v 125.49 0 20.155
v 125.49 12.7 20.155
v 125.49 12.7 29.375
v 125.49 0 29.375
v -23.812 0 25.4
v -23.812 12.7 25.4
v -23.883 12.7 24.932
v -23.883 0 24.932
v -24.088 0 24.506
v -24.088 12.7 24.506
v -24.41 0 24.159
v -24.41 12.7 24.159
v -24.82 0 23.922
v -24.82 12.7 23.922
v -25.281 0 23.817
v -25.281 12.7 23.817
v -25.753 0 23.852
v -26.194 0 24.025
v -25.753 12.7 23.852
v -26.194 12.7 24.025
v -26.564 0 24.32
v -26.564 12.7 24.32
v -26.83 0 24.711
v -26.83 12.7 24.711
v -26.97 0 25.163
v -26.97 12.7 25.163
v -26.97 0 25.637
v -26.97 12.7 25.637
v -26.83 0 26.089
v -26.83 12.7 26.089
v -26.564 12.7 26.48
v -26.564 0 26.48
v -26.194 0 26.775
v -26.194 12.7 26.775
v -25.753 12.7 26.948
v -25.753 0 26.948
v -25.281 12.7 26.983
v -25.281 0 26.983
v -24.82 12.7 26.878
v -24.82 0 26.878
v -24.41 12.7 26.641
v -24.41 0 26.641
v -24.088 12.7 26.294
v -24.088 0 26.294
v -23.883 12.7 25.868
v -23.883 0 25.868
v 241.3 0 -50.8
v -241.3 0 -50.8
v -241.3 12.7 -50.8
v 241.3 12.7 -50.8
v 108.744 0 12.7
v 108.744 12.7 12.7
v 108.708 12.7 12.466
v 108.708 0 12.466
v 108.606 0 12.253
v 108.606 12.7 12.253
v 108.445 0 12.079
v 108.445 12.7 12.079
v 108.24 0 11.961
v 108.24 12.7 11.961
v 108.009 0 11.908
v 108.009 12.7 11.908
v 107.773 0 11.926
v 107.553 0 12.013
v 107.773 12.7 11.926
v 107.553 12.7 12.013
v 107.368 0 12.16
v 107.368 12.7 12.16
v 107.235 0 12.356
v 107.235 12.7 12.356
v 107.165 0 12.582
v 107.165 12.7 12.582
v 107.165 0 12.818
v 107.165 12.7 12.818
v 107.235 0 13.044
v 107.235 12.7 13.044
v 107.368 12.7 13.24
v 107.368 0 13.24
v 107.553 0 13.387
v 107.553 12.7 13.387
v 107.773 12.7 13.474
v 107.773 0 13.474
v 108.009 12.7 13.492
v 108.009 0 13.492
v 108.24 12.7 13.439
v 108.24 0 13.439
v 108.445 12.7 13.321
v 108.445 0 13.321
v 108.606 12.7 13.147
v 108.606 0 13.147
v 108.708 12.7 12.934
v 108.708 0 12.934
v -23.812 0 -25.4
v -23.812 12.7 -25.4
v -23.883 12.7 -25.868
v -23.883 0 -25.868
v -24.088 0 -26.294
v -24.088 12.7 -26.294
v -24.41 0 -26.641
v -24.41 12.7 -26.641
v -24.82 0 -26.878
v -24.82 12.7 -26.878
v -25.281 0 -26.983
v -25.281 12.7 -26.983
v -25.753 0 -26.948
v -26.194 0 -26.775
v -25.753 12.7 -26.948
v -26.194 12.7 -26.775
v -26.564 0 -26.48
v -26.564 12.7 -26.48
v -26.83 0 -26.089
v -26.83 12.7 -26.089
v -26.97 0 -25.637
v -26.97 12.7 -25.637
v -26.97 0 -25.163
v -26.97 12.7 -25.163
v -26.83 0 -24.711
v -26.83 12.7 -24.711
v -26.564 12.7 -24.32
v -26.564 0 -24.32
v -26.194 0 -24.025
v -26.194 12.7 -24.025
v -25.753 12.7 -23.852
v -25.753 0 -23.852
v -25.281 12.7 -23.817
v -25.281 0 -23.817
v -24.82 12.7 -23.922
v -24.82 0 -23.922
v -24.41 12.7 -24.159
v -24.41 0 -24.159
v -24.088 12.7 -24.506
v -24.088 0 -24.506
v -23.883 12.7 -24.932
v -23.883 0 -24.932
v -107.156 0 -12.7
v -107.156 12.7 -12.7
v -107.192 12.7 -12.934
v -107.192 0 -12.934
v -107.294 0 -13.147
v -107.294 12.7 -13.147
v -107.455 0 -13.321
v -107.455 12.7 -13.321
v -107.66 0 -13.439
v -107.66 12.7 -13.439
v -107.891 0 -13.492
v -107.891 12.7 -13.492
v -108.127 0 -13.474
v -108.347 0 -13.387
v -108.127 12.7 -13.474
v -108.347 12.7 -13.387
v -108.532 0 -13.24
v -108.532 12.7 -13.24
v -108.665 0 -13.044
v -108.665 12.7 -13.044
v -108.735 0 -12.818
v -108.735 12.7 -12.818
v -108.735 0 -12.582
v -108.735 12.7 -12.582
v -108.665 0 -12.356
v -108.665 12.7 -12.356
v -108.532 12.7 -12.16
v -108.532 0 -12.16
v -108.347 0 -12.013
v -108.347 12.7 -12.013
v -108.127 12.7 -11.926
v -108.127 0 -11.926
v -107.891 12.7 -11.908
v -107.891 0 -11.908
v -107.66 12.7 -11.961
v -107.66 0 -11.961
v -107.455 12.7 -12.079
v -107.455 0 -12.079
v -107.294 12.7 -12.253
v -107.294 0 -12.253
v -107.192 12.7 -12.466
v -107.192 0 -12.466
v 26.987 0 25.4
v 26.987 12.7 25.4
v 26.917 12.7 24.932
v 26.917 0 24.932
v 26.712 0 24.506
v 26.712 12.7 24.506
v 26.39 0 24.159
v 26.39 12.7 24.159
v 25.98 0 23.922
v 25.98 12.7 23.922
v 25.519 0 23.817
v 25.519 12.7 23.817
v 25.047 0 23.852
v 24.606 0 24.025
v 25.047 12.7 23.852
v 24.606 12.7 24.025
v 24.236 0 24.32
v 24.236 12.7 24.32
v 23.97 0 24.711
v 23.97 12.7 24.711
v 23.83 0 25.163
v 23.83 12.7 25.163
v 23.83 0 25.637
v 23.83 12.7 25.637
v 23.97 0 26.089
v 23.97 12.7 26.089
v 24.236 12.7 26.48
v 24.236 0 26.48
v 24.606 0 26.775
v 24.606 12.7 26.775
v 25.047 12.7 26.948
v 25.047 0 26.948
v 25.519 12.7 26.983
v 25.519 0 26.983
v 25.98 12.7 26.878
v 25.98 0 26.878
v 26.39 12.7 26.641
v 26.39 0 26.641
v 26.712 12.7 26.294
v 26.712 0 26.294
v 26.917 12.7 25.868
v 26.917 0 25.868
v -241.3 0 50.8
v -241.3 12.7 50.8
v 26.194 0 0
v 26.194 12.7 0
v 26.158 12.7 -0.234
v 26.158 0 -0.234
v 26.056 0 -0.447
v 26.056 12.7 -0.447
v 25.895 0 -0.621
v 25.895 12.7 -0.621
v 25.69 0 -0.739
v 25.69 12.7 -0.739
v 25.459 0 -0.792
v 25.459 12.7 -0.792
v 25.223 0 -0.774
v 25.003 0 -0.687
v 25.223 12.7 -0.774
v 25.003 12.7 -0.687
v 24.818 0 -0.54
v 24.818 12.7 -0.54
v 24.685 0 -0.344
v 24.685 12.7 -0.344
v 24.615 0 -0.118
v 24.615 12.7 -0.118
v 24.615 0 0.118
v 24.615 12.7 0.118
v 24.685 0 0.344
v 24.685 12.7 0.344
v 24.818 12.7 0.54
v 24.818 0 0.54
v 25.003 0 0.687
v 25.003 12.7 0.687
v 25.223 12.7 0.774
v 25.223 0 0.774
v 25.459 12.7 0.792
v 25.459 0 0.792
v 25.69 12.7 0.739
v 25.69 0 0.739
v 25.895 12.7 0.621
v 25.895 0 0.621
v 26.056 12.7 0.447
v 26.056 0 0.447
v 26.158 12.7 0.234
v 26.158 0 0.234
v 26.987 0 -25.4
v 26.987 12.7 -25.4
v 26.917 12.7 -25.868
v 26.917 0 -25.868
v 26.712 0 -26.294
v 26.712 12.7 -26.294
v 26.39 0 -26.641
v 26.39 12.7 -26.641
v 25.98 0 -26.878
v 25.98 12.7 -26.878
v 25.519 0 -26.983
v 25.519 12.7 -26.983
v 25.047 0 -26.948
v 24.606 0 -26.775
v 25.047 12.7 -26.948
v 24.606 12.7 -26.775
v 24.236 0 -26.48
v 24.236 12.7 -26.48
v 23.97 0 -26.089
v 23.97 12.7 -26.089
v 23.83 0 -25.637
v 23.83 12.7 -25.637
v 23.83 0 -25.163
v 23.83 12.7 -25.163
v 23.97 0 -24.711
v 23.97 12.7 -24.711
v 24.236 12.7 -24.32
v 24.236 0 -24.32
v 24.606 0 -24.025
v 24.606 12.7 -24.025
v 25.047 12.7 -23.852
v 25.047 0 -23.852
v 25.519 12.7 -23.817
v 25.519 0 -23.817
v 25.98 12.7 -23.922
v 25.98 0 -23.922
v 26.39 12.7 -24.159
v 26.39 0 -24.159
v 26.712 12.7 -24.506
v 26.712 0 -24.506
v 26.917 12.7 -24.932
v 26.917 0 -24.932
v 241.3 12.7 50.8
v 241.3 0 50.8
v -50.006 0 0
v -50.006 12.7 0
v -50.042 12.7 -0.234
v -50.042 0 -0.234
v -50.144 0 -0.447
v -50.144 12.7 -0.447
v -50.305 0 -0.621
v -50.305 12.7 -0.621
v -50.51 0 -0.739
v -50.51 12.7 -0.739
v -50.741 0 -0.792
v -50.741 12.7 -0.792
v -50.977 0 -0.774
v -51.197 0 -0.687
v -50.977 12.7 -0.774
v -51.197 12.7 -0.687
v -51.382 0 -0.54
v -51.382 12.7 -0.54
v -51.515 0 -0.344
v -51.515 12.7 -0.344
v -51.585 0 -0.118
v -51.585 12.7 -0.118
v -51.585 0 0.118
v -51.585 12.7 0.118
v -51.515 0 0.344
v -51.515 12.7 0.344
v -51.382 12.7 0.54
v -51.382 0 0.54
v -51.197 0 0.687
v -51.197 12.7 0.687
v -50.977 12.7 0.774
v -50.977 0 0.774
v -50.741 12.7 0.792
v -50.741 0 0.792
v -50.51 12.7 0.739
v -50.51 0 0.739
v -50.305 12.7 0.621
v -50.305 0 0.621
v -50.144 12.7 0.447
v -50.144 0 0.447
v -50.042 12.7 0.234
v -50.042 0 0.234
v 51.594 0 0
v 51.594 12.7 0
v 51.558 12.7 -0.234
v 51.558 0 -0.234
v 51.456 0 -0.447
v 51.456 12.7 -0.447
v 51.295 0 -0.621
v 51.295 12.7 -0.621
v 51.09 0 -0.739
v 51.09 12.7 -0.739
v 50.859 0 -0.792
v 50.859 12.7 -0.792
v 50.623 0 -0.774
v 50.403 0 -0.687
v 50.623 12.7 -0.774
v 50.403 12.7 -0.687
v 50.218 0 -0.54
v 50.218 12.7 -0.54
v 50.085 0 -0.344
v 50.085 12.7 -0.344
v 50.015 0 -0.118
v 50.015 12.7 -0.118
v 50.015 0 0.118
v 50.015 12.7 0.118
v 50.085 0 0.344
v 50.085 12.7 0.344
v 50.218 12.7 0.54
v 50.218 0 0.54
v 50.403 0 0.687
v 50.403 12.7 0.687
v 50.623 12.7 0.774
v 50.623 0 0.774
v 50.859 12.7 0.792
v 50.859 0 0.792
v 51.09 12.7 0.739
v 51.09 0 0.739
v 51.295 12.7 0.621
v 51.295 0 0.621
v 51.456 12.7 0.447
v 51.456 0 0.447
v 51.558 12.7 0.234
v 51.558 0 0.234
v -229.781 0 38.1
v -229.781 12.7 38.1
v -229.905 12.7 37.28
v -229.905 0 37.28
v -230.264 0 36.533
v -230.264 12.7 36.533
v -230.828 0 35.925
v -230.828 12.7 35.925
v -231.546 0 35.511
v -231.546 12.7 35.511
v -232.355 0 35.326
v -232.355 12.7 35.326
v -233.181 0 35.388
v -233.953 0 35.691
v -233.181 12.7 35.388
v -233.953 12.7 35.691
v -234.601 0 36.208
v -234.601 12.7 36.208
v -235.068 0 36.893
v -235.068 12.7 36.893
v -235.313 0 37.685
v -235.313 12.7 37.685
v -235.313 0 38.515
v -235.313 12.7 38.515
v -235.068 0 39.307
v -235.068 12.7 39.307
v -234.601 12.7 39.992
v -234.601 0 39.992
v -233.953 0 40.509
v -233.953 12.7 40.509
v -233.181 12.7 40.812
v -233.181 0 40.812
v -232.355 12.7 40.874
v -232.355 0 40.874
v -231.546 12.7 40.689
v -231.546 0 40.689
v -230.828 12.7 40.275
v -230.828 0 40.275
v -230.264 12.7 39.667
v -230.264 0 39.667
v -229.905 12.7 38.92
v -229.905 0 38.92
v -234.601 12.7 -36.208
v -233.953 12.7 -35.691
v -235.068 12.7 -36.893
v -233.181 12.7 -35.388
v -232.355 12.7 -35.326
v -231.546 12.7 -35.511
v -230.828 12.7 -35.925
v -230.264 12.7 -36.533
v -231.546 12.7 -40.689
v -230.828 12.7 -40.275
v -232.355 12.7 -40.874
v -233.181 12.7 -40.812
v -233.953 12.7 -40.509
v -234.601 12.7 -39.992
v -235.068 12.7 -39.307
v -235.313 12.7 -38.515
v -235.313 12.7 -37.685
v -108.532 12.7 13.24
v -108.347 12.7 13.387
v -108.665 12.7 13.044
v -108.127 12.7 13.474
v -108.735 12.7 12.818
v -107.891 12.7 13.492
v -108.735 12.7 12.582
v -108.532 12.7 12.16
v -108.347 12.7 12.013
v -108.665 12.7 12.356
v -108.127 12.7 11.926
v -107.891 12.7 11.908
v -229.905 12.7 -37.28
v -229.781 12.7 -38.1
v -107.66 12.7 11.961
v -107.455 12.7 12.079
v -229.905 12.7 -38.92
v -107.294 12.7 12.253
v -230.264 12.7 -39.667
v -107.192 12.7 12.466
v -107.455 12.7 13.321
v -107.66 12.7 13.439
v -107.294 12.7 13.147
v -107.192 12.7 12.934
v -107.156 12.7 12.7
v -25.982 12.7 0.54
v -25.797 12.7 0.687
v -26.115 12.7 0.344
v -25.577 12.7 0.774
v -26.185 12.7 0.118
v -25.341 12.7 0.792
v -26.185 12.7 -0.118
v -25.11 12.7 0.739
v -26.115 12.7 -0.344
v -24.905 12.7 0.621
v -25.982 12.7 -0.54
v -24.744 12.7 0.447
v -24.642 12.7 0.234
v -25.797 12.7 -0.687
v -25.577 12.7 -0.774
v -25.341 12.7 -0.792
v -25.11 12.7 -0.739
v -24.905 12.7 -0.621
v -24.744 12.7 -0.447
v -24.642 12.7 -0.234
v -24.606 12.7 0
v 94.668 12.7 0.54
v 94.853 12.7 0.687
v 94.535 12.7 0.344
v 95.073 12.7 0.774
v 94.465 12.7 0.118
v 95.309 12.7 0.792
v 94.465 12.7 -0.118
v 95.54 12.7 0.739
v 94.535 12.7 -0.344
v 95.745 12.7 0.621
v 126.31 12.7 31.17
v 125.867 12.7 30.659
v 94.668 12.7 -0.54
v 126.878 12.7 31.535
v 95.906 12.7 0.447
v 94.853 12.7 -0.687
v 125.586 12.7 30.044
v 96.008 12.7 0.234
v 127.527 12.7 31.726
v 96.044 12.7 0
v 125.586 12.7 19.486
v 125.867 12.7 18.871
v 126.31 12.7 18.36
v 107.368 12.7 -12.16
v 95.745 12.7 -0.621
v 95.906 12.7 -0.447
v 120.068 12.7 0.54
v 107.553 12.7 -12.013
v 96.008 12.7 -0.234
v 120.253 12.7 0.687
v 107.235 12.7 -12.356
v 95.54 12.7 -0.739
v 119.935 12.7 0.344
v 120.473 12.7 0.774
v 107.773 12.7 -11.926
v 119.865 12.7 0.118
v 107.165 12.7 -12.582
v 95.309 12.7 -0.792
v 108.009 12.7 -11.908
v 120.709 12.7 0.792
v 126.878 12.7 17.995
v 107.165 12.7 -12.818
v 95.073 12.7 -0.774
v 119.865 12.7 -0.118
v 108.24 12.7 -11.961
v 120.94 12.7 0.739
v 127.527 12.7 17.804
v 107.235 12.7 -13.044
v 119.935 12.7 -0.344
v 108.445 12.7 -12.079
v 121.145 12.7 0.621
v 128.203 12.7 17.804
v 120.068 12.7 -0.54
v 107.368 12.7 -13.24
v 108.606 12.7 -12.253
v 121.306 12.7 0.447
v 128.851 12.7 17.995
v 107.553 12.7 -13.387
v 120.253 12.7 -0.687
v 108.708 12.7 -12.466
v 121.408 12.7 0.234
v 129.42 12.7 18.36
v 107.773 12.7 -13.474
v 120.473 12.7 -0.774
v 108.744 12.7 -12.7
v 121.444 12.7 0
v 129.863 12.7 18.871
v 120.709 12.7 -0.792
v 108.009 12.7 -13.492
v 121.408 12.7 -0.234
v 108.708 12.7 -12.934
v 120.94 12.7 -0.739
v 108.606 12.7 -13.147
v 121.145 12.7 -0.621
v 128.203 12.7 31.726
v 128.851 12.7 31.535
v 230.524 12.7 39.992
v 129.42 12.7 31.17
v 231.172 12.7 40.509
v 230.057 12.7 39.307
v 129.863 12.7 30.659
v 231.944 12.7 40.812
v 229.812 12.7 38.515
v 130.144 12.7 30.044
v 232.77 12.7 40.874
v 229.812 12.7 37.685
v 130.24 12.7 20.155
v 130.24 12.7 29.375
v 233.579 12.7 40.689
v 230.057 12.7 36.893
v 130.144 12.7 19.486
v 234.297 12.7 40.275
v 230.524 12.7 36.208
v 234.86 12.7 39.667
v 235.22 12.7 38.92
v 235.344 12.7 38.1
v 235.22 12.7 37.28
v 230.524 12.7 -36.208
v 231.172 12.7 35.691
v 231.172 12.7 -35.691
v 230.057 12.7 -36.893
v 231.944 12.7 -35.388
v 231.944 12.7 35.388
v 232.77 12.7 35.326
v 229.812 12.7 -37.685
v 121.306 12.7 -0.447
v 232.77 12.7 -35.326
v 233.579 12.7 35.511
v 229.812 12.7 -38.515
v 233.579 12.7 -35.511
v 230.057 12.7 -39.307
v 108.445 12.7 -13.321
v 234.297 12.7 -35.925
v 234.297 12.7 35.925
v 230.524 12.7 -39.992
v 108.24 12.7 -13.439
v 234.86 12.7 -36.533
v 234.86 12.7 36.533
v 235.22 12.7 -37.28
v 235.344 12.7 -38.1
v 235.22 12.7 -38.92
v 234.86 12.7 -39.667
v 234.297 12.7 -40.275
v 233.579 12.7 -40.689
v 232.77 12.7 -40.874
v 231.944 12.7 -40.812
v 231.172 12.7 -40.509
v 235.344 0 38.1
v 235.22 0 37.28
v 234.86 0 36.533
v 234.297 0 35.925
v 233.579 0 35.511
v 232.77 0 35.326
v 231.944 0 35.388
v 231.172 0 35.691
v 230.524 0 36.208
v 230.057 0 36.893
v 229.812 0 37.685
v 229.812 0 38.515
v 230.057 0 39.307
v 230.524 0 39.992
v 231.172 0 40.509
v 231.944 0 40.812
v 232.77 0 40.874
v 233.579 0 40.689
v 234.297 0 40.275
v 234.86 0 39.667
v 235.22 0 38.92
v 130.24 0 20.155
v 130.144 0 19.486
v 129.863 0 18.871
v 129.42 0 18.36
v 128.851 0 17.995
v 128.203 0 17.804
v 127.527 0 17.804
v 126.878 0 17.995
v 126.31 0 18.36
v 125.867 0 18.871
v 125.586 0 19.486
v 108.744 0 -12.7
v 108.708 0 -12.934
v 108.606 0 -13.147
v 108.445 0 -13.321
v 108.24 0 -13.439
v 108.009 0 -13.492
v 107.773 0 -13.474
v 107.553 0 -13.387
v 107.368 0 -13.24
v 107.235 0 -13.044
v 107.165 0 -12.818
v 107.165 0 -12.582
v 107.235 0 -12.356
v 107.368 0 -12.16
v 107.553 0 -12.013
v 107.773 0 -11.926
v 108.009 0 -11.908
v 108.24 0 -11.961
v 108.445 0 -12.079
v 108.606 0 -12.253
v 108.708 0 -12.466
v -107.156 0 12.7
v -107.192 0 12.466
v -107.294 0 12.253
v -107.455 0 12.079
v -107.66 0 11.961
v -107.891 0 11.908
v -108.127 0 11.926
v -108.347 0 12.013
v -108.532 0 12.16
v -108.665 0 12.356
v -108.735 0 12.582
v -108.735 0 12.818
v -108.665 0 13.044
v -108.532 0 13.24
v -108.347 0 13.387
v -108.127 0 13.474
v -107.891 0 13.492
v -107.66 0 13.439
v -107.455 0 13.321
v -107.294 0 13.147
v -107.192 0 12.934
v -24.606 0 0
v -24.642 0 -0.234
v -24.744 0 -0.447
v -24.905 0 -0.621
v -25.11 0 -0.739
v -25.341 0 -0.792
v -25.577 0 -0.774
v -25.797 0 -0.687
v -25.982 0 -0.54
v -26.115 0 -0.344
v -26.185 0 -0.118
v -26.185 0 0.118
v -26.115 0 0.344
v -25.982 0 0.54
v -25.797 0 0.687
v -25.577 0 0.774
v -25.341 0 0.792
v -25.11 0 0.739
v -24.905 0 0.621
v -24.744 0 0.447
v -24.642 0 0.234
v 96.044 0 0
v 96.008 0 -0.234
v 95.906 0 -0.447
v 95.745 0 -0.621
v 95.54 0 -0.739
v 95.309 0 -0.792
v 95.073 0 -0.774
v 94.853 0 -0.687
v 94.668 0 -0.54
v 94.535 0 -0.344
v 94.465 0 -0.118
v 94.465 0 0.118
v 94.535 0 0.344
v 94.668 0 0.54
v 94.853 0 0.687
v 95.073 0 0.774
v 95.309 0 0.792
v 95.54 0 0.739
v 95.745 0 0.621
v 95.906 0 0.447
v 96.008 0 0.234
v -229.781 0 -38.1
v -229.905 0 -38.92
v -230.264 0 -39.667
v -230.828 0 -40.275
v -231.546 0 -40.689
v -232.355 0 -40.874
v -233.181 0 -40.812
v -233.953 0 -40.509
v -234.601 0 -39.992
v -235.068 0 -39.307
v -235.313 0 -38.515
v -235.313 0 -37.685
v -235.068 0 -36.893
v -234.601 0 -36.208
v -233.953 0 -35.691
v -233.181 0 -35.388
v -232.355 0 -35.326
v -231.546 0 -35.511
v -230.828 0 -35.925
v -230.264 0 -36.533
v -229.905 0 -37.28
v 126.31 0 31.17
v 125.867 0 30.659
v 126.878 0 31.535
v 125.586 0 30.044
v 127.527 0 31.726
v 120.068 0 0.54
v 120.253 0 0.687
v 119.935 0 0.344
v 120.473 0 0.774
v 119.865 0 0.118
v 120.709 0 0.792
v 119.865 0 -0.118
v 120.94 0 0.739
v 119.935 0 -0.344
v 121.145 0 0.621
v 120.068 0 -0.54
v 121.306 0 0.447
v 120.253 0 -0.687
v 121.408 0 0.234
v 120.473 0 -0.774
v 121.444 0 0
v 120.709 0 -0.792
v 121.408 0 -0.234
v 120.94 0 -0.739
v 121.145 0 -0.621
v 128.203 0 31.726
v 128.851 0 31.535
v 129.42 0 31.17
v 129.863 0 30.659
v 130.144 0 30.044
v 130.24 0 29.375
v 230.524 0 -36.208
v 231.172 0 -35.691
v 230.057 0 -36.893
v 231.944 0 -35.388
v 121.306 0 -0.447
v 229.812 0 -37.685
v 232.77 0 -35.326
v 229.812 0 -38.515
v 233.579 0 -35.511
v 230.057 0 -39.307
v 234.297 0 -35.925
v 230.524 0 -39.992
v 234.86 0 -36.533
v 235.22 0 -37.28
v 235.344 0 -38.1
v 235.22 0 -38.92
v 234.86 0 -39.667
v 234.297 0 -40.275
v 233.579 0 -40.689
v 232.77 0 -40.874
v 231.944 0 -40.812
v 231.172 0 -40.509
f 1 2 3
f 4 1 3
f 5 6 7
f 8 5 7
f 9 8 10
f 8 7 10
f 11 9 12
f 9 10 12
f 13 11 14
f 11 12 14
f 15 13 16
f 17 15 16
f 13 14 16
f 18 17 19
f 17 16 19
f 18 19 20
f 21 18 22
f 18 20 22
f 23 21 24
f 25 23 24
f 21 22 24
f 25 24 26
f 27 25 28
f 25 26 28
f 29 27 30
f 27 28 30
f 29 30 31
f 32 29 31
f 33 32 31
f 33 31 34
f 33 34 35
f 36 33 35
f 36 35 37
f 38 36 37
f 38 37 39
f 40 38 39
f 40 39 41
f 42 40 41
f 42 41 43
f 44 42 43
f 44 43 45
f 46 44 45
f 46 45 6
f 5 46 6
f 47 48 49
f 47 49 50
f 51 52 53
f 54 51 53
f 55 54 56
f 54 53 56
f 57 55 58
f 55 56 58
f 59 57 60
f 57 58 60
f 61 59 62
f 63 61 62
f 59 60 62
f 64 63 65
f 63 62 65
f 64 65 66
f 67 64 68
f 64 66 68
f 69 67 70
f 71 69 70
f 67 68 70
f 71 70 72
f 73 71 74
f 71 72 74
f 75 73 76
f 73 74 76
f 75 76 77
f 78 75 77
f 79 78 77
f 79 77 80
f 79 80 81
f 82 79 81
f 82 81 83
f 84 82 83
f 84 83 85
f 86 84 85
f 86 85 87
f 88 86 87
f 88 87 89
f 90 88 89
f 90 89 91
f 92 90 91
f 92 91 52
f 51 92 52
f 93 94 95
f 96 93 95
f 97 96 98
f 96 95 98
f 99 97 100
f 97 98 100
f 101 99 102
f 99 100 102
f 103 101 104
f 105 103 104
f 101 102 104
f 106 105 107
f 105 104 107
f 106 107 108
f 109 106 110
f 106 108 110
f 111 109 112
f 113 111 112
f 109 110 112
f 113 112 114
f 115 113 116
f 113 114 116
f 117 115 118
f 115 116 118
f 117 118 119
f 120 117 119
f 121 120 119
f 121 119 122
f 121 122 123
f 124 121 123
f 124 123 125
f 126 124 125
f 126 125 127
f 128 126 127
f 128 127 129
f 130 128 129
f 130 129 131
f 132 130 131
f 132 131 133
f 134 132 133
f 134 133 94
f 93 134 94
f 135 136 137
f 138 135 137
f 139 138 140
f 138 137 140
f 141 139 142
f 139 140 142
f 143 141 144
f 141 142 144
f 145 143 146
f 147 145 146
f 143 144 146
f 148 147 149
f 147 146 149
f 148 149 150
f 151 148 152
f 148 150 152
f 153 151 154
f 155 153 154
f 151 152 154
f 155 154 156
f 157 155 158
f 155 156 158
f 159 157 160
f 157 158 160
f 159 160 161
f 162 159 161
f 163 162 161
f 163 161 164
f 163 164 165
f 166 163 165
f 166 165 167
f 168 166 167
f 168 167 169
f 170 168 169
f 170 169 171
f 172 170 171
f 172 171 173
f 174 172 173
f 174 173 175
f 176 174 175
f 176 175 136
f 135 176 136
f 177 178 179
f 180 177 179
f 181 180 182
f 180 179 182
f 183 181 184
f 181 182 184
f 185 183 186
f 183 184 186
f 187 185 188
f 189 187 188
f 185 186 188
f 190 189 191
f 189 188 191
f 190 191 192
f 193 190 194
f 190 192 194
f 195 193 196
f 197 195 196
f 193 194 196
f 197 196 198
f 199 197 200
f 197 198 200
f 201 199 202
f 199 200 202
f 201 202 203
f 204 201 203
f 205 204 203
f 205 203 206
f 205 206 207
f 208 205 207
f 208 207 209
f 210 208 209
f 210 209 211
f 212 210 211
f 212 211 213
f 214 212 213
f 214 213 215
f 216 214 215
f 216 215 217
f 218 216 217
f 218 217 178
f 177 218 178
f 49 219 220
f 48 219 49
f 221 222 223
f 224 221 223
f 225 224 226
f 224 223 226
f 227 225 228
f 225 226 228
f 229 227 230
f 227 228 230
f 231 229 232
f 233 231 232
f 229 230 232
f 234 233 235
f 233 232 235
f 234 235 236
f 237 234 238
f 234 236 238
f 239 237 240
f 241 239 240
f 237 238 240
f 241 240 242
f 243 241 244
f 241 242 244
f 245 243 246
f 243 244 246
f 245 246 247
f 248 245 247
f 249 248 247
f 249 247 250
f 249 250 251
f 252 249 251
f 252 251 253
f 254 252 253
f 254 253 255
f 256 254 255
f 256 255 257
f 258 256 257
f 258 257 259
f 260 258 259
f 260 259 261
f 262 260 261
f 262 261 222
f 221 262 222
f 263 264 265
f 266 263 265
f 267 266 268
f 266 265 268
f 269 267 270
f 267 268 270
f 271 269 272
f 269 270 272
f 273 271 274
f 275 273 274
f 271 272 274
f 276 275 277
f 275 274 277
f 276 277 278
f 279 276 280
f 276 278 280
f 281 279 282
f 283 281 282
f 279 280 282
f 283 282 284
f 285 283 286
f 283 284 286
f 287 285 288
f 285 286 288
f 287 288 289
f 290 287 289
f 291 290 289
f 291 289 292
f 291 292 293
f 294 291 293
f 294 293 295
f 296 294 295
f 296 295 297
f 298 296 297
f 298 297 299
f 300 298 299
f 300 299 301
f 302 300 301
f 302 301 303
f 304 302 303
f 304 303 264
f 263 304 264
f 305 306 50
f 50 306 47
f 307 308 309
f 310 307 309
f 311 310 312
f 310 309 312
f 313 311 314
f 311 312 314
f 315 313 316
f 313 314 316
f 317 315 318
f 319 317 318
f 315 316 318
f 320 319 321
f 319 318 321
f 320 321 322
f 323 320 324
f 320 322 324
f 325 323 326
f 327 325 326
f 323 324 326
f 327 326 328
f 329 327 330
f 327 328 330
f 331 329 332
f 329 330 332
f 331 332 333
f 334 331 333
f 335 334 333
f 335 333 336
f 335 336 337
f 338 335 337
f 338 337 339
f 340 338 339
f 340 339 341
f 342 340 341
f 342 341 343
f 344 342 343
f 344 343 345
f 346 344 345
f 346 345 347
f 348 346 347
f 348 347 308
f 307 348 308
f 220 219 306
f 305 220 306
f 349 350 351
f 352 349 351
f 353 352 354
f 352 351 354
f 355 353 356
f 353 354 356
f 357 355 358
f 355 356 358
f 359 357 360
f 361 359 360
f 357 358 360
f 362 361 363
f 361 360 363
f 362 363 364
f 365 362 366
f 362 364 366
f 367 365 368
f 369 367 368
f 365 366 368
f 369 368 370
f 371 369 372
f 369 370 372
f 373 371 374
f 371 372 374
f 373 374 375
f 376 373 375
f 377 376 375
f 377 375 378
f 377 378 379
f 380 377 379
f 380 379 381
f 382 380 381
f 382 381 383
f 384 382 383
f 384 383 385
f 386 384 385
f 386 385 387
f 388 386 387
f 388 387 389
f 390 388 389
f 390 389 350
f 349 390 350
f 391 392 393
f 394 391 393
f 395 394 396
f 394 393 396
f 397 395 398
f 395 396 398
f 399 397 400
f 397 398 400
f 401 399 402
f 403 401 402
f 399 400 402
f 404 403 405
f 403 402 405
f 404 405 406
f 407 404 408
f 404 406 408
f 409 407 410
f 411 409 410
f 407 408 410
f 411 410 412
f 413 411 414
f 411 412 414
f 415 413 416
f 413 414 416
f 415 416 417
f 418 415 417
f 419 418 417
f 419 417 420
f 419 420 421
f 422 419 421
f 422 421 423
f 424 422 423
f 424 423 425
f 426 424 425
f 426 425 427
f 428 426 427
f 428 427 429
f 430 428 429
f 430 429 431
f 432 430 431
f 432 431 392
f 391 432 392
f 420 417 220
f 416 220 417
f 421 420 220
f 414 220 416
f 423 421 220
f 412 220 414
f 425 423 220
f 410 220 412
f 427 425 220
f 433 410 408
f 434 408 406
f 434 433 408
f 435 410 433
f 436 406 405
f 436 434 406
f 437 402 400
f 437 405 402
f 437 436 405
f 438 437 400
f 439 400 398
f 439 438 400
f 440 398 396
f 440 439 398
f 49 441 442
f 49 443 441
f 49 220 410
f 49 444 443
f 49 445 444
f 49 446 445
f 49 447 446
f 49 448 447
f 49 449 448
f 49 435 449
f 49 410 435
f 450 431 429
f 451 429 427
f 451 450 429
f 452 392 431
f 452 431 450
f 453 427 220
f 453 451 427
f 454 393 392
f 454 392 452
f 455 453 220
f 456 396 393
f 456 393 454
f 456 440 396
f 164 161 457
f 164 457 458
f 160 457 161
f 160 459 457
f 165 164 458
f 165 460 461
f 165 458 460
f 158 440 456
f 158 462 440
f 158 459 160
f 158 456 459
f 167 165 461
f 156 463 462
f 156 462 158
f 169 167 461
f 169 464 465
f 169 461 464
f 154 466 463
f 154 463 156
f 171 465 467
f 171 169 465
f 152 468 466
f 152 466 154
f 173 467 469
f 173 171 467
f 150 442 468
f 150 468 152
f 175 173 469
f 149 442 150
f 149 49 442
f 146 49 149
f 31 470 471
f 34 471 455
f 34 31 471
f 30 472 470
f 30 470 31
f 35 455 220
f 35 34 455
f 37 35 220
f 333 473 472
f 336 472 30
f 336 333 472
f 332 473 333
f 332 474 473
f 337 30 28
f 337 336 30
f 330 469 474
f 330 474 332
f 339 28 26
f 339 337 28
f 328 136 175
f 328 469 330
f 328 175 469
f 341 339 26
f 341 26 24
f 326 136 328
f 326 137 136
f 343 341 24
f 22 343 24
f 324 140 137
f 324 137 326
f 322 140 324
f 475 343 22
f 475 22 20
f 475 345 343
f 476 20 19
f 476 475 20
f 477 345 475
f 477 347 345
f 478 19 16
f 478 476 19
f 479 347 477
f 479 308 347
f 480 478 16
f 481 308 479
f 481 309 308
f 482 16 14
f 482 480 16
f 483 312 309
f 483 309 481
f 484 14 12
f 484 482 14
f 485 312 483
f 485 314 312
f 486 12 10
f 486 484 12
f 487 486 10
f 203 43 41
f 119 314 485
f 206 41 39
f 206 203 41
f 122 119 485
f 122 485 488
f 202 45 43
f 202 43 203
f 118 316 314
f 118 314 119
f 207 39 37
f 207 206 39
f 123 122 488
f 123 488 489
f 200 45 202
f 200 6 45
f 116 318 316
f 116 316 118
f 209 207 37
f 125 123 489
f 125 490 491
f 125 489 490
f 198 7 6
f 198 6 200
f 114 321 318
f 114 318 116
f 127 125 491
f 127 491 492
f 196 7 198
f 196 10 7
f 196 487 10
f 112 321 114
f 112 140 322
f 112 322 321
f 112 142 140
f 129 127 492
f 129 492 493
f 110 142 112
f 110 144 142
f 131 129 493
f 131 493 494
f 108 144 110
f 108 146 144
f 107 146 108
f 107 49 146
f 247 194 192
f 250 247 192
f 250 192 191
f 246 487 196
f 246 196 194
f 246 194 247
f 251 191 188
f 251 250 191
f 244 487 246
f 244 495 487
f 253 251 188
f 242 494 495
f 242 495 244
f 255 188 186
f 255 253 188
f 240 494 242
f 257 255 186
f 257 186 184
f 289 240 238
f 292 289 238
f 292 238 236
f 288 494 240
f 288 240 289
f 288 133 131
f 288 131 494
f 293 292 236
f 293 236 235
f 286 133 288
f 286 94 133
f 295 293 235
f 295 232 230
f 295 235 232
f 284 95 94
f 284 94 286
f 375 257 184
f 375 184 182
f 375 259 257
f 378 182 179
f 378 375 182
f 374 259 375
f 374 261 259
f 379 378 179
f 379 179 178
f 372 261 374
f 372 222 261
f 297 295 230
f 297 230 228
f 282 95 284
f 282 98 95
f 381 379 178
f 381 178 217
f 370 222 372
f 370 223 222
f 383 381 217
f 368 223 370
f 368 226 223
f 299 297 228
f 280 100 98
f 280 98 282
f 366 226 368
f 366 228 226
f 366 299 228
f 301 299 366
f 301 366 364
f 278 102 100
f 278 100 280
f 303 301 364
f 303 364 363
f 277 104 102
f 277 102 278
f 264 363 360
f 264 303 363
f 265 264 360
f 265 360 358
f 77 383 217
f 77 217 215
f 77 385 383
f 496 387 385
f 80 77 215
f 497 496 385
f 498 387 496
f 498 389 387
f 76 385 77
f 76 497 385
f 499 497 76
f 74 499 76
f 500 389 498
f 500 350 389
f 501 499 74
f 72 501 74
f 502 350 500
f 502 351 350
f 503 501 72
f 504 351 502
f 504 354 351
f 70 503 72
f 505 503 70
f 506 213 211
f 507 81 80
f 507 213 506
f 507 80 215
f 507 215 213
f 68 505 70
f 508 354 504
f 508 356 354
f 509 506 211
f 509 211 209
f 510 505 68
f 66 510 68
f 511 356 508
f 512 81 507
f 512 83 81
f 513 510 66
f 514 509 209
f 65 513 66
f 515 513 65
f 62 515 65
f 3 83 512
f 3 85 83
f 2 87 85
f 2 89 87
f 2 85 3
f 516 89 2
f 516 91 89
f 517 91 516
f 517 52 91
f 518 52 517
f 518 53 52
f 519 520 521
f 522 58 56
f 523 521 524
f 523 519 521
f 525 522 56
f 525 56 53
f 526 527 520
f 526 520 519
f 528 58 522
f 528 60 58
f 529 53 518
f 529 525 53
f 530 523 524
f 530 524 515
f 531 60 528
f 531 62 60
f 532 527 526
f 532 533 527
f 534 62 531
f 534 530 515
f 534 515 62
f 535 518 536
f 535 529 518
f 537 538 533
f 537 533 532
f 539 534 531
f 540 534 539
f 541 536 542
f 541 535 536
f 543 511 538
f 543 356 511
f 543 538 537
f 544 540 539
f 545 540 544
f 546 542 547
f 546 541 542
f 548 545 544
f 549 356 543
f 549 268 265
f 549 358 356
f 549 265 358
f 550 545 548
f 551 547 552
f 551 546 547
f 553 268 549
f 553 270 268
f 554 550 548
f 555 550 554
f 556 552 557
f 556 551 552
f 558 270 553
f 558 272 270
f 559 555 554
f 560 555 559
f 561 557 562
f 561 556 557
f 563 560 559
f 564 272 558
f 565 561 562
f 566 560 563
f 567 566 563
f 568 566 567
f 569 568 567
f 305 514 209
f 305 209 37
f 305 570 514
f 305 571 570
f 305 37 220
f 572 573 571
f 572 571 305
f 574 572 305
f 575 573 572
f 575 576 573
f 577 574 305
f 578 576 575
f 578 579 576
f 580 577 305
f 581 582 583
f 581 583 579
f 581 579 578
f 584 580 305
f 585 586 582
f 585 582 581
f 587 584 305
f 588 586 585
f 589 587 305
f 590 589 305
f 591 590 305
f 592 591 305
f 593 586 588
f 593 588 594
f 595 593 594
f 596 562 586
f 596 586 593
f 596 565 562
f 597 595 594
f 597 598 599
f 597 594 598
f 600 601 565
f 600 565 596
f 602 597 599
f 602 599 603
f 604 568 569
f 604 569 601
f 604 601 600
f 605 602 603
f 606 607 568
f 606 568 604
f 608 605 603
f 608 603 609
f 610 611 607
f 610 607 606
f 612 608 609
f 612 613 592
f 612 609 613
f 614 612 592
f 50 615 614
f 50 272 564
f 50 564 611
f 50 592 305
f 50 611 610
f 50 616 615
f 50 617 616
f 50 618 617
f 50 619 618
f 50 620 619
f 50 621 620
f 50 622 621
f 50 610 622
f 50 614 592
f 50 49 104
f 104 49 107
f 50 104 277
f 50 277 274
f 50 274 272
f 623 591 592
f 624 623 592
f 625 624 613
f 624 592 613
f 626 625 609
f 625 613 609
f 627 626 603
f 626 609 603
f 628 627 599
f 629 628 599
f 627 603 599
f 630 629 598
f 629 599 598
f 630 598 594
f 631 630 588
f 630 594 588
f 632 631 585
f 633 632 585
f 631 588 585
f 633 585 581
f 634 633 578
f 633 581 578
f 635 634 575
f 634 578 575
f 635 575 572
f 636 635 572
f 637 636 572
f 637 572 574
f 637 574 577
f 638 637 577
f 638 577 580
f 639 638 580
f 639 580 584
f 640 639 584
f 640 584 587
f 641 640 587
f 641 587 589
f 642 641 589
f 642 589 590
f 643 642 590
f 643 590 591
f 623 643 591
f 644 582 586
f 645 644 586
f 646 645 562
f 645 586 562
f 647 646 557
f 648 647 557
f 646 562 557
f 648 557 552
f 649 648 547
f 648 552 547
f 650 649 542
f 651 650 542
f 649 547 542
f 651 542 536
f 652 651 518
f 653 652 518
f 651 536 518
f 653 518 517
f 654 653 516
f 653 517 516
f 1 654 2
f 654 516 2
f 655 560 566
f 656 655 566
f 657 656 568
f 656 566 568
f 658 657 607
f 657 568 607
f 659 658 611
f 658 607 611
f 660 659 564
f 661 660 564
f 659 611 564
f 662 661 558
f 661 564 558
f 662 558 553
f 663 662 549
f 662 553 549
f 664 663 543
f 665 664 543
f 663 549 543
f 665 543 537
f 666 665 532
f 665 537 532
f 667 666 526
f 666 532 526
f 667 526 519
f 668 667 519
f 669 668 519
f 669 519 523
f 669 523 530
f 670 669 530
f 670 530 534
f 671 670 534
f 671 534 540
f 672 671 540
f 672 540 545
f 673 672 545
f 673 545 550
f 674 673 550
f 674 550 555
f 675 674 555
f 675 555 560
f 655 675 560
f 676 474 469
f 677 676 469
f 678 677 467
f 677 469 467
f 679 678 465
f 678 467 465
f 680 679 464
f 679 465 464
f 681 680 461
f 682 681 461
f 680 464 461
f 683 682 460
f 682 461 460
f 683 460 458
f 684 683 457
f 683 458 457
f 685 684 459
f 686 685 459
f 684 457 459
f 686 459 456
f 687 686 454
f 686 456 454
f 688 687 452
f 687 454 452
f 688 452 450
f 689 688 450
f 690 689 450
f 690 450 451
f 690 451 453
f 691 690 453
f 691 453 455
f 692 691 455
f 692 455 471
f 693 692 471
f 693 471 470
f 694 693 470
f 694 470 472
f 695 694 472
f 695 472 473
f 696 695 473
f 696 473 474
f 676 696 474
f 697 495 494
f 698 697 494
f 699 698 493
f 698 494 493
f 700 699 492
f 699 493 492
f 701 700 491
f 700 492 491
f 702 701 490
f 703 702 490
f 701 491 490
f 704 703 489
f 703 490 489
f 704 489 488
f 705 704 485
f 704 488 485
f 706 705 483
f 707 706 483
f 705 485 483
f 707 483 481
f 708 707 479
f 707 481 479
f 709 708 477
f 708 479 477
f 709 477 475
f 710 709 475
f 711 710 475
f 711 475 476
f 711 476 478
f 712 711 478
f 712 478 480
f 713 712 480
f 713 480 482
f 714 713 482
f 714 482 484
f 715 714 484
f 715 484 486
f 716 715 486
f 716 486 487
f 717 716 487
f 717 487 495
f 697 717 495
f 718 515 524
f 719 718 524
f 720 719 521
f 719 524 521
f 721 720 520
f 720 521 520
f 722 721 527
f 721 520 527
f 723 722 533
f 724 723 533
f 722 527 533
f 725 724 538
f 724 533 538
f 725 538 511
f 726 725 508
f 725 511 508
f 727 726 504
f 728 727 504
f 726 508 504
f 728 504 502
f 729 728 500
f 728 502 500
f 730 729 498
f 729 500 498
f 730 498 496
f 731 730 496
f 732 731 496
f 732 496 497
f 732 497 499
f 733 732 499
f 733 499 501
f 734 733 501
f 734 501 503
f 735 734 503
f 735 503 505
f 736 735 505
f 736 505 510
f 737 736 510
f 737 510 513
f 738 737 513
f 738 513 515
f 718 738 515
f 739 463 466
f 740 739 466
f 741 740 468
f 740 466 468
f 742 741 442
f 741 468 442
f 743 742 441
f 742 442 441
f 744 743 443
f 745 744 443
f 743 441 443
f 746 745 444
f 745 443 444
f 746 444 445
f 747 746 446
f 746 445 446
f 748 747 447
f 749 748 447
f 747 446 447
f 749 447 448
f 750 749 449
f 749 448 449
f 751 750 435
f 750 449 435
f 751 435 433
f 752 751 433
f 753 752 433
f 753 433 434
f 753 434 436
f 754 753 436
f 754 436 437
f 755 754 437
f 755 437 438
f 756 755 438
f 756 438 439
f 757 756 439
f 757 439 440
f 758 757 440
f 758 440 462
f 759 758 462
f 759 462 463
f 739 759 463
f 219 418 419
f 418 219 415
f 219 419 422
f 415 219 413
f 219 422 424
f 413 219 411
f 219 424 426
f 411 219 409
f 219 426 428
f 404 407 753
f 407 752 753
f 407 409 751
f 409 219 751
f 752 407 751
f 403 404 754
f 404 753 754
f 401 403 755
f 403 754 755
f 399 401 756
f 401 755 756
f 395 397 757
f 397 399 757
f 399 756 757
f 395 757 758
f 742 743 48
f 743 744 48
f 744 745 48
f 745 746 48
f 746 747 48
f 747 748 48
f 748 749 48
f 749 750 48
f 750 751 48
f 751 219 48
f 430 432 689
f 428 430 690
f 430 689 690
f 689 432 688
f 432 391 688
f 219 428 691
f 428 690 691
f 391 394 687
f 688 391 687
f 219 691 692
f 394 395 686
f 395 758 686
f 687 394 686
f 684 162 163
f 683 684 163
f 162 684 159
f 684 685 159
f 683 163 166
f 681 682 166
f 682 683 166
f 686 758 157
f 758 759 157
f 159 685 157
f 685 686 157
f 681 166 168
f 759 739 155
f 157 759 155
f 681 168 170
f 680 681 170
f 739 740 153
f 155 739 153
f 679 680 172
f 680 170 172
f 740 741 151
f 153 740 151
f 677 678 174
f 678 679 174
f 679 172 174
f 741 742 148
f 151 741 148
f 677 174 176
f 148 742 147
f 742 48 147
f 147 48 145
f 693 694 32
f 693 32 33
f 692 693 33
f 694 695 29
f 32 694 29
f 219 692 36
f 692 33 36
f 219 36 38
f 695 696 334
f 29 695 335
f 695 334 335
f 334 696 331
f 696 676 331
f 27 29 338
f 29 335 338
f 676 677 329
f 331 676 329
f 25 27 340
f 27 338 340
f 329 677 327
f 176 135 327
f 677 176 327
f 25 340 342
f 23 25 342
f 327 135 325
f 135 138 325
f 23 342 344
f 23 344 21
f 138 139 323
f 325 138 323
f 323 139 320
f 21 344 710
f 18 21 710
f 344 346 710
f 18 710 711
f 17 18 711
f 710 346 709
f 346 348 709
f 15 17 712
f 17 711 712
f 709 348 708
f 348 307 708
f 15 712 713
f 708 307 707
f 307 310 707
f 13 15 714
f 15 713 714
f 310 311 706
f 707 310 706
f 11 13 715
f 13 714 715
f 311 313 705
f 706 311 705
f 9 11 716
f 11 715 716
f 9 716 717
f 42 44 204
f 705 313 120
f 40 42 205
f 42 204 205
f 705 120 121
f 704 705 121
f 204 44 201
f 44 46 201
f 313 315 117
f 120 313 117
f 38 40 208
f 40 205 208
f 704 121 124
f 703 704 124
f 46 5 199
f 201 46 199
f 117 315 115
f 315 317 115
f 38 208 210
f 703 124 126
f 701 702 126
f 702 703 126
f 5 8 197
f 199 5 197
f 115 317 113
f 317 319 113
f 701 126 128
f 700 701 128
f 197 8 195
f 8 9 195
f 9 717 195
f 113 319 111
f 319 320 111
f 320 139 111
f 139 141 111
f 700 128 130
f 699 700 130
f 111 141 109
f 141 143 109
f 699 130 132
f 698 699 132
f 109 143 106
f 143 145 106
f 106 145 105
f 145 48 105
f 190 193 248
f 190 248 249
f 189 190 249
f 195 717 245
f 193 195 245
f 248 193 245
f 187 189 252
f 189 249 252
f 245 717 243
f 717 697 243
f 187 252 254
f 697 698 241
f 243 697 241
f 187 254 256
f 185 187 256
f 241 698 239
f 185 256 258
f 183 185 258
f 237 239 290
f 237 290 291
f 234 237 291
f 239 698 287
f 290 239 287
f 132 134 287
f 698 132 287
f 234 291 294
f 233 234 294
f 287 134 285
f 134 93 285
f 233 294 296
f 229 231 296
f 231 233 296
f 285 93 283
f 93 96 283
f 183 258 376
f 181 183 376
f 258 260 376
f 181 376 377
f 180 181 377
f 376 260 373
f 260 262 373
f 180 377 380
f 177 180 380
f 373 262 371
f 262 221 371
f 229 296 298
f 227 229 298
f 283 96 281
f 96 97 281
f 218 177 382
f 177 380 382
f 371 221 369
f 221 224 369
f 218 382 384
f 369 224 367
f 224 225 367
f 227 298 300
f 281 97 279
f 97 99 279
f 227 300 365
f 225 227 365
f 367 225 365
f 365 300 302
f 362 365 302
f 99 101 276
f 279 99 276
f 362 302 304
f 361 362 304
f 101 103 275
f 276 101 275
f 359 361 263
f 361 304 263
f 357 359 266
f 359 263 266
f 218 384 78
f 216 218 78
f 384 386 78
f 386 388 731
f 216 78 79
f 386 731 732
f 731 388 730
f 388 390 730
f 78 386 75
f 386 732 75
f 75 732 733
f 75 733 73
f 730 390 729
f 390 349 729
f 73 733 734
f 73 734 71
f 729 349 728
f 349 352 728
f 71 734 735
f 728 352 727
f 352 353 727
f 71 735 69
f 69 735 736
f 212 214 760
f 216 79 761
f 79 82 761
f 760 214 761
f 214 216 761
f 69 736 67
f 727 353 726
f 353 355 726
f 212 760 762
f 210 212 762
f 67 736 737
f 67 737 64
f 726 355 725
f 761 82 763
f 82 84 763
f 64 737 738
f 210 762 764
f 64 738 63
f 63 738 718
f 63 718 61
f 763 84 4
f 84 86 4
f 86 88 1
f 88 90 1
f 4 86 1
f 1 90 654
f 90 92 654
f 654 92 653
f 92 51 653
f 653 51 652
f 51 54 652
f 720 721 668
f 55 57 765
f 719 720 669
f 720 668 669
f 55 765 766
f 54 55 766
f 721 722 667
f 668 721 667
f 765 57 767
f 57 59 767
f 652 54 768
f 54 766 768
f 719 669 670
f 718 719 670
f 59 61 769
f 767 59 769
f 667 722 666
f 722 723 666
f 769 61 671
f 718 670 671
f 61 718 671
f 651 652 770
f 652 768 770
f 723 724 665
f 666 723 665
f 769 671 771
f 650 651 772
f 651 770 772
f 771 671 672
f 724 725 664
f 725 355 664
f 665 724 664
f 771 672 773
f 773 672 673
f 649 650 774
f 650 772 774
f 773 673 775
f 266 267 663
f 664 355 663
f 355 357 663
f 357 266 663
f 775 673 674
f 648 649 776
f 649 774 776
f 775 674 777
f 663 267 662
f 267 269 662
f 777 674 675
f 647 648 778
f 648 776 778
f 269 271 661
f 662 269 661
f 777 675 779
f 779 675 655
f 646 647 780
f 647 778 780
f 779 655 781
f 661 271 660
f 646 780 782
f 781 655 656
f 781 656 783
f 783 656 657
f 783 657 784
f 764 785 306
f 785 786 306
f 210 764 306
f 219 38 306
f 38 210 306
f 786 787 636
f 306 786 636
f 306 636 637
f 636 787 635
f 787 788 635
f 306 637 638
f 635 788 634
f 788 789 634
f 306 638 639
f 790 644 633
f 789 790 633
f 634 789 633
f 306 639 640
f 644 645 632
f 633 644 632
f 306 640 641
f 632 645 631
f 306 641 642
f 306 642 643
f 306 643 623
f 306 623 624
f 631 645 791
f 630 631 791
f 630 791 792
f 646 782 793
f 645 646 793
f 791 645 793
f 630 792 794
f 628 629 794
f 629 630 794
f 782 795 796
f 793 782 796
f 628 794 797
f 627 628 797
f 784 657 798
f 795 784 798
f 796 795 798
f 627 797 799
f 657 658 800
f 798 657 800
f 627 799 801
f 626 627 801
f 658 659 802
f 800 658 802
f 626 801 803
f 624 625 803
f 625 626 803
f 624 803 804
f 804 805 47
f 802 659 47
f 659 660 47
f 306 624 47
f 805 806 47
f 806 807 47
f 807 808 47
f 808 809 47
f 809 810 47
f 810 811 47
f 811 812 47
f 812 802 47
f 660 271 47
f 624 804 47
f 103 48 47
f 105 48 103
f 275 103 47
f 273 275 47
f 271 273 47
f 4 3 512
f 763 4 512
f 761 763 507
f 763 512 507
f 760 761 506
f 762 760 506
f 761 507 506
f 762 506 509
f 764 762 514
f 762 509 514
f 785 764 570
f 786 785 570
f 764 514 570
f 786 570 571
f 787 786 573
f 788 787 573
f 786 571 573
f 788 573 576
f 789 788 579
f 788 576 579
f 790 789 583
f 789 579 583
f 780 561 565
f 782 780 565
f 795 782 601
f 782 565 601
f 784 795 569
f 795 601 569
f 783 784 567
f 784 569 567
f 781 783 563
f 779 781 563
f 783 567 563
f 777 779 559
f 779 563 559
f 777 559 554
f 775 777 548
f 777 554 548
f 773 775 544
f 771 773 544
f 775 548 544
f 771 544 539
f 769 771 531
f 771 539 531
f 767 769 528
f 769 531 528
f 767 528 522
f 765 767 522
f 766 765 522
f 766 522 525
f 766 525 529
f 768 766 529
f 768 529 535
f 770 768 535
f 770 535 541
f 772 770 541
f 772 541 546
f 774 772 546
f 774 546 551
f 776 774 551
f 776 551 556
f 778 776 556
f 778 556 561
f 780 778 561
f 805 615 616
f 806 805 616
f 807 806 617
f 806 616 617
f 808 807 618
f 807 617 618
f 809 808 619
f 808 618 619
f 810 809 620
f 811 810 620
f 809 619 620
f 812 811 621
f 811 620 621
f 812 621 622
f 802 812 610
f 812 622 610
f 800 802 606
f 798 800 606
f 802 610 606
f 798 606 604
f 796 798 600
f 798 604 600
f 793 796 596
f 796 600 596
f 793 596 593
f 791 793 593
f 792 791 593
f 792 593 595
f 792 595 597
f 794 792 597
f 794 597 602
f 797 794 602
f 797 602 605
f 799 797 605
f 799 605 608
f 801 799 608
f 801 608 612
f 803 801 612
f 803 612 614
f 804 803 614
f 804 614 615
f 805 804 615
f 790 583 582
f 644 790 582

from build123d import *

# Parameters (mm, degrees)
SKETCH1_W           = 482.6
SKETCH1_H           = 101.6
BOSS_EXTRUDE1_DEPTH = 12.7
SKETCH2_R           = 2.7813
CUT_EXTRUDE1_DEPTH  = 13.7
SKETCH3_R           = 1.5875
CUT_EXTRUDE2_DEPTH  = 13.7
SKETCH4_R           = 0.79375
CUT_EXTRUDE3_DEPTH  = 13.7
SKETCH5_R           = 0.79375
CUT_EXTRUDE4_DEPTH  = 13.7
CUT_EXTRUDE5_DEPTH  = 13.7


with BuildPart() as part:
    # Sketch1 → Boss-Extrude1 (new body)
    with BuildSketch(Plane(origin=(0, 0, 0), x_dir=(1, 0, 0), z_dir=(0, 1, 0))):
        Rectangle(SKETCH1_W, SKETCH1_H)
    extrude(amount=BOSS_EXTRUDE1_DEPTH)

    # Sketch2 → Cut-Extrude1 (cut, through all)
    with BuildSketch(Plane(origin=(0, 12.7, 0), x_dir=(1, 0, 0), z_dir=(0, 1, 0))):
        with Locations((-232.5624, 38.1)):
            Circle(SKETCH2_R)
        with Locations((-232.5624, -38.1)):
            Circle(SKETCH2_R)
        with Locations((232.5624, 38.1)):
            Circle(SKETCH2_R)
        with Locations((232.5624, -38.1)):
            Circle(SKETCH2_R)
    extrude(amount=-CUT_EXTRUDE1_DEPTH, mode=Mode.SUBTRACT)

    # Sketch3 → Cut-Extrude2 (cut, through all)
    with BuildSketch(Plane(origin=(0, 12.7, 0), x_dir=(1, 0, 0), z_dir=(0, 1, 0))):
        with Locations((-25.4, 25.4)):
            Circle(SKETCH3_R)
        with Locations((25.4, 25.4)):
            Circle(SKETCH3_R)
        with Locations((25.4, -25.4)):
            Circle(SKETCH3_R)
        with Locations((-25.4, -25.4)):
            Circle(SKETCH3_R)
    extrude(amount=-CUT_EXTRUDE2_DEPTH, mode=Mode.SUBTRACT)

    # Sketch4 → Cut-Extrude3 (cut, through all)
    with BuildSketch(Plane(origin=(0, 12.7, 0), x_dir=(1, 0, 0), z_dir=(0, 1, 0))):
        with Locations((-25.4, 0)):
            Circle(SKETCH4_R)
        with Locations((25.4, 0)):
            Circle(SKETCH4_R)
        with Locations((-50.8, 0)):
            Circle(SKETCH4_R)
        with Locations((50.8, 0)):
            Circle(SKETCH4_R)
        with Locations((-107.95, 12.7)):
            Circle(SKETCH4_R)
        with Locations((-107.95, -12.7)):
            Circle(SKETCH4_R)
        with Locations((107.95, -12.7)):
            Circle(SKETCH4_R)
        with Locations((107.95, 12.7)):
            Circle(SKETCH4_R)
    extrude(amount=-CUT_EXTRUDE3_DEPTH, mode=Mode.SUBTRACT)

    # Sketch5 → Cut-Extrude4 (cut, through all)
    with BuildSketch(Plane(origin=(0, 12.7, 0), x_dir=(1, 0, 0), z_dir=(0, 1, 0))):
        with Locations((95.25, 0)):
            Circle(SKETCH5_R)
        with Locations((120.65, 0)):
            Circle(SKETCH5_R)
    extrude(amount=-CUT_EXTRUDE4_DEPTH, mode=Mode.SUBTRACT)

    # Sketch6 → Cut-Extrude5 (cut, through all)
    with BuildSketch(Plane(origin=(0, 12.7, 0), x_dir=(1, 0, 0), z_dir=(0, 1, 0))):
        with BuildLine():
            Line((125.489928348, -20.1549), (125.489928348, -29.3751))
            ThreePointArc((125.489928348, -29.3751), (127.864828348, -31.75), (130.239728348, -29.3751))
            Line((130.239728348, -29.3751), (130.239728348, -20.1549))
            ThreePointArc((130.239728348, -20.1549), (127.864828348, -17.78), (125.489928348, -20.1549))
        make_face()
    extrude(amount=-CUT_EXTRUDE5_DEPTH, mode=Mode.SUBTRACT)


solid = part.part
